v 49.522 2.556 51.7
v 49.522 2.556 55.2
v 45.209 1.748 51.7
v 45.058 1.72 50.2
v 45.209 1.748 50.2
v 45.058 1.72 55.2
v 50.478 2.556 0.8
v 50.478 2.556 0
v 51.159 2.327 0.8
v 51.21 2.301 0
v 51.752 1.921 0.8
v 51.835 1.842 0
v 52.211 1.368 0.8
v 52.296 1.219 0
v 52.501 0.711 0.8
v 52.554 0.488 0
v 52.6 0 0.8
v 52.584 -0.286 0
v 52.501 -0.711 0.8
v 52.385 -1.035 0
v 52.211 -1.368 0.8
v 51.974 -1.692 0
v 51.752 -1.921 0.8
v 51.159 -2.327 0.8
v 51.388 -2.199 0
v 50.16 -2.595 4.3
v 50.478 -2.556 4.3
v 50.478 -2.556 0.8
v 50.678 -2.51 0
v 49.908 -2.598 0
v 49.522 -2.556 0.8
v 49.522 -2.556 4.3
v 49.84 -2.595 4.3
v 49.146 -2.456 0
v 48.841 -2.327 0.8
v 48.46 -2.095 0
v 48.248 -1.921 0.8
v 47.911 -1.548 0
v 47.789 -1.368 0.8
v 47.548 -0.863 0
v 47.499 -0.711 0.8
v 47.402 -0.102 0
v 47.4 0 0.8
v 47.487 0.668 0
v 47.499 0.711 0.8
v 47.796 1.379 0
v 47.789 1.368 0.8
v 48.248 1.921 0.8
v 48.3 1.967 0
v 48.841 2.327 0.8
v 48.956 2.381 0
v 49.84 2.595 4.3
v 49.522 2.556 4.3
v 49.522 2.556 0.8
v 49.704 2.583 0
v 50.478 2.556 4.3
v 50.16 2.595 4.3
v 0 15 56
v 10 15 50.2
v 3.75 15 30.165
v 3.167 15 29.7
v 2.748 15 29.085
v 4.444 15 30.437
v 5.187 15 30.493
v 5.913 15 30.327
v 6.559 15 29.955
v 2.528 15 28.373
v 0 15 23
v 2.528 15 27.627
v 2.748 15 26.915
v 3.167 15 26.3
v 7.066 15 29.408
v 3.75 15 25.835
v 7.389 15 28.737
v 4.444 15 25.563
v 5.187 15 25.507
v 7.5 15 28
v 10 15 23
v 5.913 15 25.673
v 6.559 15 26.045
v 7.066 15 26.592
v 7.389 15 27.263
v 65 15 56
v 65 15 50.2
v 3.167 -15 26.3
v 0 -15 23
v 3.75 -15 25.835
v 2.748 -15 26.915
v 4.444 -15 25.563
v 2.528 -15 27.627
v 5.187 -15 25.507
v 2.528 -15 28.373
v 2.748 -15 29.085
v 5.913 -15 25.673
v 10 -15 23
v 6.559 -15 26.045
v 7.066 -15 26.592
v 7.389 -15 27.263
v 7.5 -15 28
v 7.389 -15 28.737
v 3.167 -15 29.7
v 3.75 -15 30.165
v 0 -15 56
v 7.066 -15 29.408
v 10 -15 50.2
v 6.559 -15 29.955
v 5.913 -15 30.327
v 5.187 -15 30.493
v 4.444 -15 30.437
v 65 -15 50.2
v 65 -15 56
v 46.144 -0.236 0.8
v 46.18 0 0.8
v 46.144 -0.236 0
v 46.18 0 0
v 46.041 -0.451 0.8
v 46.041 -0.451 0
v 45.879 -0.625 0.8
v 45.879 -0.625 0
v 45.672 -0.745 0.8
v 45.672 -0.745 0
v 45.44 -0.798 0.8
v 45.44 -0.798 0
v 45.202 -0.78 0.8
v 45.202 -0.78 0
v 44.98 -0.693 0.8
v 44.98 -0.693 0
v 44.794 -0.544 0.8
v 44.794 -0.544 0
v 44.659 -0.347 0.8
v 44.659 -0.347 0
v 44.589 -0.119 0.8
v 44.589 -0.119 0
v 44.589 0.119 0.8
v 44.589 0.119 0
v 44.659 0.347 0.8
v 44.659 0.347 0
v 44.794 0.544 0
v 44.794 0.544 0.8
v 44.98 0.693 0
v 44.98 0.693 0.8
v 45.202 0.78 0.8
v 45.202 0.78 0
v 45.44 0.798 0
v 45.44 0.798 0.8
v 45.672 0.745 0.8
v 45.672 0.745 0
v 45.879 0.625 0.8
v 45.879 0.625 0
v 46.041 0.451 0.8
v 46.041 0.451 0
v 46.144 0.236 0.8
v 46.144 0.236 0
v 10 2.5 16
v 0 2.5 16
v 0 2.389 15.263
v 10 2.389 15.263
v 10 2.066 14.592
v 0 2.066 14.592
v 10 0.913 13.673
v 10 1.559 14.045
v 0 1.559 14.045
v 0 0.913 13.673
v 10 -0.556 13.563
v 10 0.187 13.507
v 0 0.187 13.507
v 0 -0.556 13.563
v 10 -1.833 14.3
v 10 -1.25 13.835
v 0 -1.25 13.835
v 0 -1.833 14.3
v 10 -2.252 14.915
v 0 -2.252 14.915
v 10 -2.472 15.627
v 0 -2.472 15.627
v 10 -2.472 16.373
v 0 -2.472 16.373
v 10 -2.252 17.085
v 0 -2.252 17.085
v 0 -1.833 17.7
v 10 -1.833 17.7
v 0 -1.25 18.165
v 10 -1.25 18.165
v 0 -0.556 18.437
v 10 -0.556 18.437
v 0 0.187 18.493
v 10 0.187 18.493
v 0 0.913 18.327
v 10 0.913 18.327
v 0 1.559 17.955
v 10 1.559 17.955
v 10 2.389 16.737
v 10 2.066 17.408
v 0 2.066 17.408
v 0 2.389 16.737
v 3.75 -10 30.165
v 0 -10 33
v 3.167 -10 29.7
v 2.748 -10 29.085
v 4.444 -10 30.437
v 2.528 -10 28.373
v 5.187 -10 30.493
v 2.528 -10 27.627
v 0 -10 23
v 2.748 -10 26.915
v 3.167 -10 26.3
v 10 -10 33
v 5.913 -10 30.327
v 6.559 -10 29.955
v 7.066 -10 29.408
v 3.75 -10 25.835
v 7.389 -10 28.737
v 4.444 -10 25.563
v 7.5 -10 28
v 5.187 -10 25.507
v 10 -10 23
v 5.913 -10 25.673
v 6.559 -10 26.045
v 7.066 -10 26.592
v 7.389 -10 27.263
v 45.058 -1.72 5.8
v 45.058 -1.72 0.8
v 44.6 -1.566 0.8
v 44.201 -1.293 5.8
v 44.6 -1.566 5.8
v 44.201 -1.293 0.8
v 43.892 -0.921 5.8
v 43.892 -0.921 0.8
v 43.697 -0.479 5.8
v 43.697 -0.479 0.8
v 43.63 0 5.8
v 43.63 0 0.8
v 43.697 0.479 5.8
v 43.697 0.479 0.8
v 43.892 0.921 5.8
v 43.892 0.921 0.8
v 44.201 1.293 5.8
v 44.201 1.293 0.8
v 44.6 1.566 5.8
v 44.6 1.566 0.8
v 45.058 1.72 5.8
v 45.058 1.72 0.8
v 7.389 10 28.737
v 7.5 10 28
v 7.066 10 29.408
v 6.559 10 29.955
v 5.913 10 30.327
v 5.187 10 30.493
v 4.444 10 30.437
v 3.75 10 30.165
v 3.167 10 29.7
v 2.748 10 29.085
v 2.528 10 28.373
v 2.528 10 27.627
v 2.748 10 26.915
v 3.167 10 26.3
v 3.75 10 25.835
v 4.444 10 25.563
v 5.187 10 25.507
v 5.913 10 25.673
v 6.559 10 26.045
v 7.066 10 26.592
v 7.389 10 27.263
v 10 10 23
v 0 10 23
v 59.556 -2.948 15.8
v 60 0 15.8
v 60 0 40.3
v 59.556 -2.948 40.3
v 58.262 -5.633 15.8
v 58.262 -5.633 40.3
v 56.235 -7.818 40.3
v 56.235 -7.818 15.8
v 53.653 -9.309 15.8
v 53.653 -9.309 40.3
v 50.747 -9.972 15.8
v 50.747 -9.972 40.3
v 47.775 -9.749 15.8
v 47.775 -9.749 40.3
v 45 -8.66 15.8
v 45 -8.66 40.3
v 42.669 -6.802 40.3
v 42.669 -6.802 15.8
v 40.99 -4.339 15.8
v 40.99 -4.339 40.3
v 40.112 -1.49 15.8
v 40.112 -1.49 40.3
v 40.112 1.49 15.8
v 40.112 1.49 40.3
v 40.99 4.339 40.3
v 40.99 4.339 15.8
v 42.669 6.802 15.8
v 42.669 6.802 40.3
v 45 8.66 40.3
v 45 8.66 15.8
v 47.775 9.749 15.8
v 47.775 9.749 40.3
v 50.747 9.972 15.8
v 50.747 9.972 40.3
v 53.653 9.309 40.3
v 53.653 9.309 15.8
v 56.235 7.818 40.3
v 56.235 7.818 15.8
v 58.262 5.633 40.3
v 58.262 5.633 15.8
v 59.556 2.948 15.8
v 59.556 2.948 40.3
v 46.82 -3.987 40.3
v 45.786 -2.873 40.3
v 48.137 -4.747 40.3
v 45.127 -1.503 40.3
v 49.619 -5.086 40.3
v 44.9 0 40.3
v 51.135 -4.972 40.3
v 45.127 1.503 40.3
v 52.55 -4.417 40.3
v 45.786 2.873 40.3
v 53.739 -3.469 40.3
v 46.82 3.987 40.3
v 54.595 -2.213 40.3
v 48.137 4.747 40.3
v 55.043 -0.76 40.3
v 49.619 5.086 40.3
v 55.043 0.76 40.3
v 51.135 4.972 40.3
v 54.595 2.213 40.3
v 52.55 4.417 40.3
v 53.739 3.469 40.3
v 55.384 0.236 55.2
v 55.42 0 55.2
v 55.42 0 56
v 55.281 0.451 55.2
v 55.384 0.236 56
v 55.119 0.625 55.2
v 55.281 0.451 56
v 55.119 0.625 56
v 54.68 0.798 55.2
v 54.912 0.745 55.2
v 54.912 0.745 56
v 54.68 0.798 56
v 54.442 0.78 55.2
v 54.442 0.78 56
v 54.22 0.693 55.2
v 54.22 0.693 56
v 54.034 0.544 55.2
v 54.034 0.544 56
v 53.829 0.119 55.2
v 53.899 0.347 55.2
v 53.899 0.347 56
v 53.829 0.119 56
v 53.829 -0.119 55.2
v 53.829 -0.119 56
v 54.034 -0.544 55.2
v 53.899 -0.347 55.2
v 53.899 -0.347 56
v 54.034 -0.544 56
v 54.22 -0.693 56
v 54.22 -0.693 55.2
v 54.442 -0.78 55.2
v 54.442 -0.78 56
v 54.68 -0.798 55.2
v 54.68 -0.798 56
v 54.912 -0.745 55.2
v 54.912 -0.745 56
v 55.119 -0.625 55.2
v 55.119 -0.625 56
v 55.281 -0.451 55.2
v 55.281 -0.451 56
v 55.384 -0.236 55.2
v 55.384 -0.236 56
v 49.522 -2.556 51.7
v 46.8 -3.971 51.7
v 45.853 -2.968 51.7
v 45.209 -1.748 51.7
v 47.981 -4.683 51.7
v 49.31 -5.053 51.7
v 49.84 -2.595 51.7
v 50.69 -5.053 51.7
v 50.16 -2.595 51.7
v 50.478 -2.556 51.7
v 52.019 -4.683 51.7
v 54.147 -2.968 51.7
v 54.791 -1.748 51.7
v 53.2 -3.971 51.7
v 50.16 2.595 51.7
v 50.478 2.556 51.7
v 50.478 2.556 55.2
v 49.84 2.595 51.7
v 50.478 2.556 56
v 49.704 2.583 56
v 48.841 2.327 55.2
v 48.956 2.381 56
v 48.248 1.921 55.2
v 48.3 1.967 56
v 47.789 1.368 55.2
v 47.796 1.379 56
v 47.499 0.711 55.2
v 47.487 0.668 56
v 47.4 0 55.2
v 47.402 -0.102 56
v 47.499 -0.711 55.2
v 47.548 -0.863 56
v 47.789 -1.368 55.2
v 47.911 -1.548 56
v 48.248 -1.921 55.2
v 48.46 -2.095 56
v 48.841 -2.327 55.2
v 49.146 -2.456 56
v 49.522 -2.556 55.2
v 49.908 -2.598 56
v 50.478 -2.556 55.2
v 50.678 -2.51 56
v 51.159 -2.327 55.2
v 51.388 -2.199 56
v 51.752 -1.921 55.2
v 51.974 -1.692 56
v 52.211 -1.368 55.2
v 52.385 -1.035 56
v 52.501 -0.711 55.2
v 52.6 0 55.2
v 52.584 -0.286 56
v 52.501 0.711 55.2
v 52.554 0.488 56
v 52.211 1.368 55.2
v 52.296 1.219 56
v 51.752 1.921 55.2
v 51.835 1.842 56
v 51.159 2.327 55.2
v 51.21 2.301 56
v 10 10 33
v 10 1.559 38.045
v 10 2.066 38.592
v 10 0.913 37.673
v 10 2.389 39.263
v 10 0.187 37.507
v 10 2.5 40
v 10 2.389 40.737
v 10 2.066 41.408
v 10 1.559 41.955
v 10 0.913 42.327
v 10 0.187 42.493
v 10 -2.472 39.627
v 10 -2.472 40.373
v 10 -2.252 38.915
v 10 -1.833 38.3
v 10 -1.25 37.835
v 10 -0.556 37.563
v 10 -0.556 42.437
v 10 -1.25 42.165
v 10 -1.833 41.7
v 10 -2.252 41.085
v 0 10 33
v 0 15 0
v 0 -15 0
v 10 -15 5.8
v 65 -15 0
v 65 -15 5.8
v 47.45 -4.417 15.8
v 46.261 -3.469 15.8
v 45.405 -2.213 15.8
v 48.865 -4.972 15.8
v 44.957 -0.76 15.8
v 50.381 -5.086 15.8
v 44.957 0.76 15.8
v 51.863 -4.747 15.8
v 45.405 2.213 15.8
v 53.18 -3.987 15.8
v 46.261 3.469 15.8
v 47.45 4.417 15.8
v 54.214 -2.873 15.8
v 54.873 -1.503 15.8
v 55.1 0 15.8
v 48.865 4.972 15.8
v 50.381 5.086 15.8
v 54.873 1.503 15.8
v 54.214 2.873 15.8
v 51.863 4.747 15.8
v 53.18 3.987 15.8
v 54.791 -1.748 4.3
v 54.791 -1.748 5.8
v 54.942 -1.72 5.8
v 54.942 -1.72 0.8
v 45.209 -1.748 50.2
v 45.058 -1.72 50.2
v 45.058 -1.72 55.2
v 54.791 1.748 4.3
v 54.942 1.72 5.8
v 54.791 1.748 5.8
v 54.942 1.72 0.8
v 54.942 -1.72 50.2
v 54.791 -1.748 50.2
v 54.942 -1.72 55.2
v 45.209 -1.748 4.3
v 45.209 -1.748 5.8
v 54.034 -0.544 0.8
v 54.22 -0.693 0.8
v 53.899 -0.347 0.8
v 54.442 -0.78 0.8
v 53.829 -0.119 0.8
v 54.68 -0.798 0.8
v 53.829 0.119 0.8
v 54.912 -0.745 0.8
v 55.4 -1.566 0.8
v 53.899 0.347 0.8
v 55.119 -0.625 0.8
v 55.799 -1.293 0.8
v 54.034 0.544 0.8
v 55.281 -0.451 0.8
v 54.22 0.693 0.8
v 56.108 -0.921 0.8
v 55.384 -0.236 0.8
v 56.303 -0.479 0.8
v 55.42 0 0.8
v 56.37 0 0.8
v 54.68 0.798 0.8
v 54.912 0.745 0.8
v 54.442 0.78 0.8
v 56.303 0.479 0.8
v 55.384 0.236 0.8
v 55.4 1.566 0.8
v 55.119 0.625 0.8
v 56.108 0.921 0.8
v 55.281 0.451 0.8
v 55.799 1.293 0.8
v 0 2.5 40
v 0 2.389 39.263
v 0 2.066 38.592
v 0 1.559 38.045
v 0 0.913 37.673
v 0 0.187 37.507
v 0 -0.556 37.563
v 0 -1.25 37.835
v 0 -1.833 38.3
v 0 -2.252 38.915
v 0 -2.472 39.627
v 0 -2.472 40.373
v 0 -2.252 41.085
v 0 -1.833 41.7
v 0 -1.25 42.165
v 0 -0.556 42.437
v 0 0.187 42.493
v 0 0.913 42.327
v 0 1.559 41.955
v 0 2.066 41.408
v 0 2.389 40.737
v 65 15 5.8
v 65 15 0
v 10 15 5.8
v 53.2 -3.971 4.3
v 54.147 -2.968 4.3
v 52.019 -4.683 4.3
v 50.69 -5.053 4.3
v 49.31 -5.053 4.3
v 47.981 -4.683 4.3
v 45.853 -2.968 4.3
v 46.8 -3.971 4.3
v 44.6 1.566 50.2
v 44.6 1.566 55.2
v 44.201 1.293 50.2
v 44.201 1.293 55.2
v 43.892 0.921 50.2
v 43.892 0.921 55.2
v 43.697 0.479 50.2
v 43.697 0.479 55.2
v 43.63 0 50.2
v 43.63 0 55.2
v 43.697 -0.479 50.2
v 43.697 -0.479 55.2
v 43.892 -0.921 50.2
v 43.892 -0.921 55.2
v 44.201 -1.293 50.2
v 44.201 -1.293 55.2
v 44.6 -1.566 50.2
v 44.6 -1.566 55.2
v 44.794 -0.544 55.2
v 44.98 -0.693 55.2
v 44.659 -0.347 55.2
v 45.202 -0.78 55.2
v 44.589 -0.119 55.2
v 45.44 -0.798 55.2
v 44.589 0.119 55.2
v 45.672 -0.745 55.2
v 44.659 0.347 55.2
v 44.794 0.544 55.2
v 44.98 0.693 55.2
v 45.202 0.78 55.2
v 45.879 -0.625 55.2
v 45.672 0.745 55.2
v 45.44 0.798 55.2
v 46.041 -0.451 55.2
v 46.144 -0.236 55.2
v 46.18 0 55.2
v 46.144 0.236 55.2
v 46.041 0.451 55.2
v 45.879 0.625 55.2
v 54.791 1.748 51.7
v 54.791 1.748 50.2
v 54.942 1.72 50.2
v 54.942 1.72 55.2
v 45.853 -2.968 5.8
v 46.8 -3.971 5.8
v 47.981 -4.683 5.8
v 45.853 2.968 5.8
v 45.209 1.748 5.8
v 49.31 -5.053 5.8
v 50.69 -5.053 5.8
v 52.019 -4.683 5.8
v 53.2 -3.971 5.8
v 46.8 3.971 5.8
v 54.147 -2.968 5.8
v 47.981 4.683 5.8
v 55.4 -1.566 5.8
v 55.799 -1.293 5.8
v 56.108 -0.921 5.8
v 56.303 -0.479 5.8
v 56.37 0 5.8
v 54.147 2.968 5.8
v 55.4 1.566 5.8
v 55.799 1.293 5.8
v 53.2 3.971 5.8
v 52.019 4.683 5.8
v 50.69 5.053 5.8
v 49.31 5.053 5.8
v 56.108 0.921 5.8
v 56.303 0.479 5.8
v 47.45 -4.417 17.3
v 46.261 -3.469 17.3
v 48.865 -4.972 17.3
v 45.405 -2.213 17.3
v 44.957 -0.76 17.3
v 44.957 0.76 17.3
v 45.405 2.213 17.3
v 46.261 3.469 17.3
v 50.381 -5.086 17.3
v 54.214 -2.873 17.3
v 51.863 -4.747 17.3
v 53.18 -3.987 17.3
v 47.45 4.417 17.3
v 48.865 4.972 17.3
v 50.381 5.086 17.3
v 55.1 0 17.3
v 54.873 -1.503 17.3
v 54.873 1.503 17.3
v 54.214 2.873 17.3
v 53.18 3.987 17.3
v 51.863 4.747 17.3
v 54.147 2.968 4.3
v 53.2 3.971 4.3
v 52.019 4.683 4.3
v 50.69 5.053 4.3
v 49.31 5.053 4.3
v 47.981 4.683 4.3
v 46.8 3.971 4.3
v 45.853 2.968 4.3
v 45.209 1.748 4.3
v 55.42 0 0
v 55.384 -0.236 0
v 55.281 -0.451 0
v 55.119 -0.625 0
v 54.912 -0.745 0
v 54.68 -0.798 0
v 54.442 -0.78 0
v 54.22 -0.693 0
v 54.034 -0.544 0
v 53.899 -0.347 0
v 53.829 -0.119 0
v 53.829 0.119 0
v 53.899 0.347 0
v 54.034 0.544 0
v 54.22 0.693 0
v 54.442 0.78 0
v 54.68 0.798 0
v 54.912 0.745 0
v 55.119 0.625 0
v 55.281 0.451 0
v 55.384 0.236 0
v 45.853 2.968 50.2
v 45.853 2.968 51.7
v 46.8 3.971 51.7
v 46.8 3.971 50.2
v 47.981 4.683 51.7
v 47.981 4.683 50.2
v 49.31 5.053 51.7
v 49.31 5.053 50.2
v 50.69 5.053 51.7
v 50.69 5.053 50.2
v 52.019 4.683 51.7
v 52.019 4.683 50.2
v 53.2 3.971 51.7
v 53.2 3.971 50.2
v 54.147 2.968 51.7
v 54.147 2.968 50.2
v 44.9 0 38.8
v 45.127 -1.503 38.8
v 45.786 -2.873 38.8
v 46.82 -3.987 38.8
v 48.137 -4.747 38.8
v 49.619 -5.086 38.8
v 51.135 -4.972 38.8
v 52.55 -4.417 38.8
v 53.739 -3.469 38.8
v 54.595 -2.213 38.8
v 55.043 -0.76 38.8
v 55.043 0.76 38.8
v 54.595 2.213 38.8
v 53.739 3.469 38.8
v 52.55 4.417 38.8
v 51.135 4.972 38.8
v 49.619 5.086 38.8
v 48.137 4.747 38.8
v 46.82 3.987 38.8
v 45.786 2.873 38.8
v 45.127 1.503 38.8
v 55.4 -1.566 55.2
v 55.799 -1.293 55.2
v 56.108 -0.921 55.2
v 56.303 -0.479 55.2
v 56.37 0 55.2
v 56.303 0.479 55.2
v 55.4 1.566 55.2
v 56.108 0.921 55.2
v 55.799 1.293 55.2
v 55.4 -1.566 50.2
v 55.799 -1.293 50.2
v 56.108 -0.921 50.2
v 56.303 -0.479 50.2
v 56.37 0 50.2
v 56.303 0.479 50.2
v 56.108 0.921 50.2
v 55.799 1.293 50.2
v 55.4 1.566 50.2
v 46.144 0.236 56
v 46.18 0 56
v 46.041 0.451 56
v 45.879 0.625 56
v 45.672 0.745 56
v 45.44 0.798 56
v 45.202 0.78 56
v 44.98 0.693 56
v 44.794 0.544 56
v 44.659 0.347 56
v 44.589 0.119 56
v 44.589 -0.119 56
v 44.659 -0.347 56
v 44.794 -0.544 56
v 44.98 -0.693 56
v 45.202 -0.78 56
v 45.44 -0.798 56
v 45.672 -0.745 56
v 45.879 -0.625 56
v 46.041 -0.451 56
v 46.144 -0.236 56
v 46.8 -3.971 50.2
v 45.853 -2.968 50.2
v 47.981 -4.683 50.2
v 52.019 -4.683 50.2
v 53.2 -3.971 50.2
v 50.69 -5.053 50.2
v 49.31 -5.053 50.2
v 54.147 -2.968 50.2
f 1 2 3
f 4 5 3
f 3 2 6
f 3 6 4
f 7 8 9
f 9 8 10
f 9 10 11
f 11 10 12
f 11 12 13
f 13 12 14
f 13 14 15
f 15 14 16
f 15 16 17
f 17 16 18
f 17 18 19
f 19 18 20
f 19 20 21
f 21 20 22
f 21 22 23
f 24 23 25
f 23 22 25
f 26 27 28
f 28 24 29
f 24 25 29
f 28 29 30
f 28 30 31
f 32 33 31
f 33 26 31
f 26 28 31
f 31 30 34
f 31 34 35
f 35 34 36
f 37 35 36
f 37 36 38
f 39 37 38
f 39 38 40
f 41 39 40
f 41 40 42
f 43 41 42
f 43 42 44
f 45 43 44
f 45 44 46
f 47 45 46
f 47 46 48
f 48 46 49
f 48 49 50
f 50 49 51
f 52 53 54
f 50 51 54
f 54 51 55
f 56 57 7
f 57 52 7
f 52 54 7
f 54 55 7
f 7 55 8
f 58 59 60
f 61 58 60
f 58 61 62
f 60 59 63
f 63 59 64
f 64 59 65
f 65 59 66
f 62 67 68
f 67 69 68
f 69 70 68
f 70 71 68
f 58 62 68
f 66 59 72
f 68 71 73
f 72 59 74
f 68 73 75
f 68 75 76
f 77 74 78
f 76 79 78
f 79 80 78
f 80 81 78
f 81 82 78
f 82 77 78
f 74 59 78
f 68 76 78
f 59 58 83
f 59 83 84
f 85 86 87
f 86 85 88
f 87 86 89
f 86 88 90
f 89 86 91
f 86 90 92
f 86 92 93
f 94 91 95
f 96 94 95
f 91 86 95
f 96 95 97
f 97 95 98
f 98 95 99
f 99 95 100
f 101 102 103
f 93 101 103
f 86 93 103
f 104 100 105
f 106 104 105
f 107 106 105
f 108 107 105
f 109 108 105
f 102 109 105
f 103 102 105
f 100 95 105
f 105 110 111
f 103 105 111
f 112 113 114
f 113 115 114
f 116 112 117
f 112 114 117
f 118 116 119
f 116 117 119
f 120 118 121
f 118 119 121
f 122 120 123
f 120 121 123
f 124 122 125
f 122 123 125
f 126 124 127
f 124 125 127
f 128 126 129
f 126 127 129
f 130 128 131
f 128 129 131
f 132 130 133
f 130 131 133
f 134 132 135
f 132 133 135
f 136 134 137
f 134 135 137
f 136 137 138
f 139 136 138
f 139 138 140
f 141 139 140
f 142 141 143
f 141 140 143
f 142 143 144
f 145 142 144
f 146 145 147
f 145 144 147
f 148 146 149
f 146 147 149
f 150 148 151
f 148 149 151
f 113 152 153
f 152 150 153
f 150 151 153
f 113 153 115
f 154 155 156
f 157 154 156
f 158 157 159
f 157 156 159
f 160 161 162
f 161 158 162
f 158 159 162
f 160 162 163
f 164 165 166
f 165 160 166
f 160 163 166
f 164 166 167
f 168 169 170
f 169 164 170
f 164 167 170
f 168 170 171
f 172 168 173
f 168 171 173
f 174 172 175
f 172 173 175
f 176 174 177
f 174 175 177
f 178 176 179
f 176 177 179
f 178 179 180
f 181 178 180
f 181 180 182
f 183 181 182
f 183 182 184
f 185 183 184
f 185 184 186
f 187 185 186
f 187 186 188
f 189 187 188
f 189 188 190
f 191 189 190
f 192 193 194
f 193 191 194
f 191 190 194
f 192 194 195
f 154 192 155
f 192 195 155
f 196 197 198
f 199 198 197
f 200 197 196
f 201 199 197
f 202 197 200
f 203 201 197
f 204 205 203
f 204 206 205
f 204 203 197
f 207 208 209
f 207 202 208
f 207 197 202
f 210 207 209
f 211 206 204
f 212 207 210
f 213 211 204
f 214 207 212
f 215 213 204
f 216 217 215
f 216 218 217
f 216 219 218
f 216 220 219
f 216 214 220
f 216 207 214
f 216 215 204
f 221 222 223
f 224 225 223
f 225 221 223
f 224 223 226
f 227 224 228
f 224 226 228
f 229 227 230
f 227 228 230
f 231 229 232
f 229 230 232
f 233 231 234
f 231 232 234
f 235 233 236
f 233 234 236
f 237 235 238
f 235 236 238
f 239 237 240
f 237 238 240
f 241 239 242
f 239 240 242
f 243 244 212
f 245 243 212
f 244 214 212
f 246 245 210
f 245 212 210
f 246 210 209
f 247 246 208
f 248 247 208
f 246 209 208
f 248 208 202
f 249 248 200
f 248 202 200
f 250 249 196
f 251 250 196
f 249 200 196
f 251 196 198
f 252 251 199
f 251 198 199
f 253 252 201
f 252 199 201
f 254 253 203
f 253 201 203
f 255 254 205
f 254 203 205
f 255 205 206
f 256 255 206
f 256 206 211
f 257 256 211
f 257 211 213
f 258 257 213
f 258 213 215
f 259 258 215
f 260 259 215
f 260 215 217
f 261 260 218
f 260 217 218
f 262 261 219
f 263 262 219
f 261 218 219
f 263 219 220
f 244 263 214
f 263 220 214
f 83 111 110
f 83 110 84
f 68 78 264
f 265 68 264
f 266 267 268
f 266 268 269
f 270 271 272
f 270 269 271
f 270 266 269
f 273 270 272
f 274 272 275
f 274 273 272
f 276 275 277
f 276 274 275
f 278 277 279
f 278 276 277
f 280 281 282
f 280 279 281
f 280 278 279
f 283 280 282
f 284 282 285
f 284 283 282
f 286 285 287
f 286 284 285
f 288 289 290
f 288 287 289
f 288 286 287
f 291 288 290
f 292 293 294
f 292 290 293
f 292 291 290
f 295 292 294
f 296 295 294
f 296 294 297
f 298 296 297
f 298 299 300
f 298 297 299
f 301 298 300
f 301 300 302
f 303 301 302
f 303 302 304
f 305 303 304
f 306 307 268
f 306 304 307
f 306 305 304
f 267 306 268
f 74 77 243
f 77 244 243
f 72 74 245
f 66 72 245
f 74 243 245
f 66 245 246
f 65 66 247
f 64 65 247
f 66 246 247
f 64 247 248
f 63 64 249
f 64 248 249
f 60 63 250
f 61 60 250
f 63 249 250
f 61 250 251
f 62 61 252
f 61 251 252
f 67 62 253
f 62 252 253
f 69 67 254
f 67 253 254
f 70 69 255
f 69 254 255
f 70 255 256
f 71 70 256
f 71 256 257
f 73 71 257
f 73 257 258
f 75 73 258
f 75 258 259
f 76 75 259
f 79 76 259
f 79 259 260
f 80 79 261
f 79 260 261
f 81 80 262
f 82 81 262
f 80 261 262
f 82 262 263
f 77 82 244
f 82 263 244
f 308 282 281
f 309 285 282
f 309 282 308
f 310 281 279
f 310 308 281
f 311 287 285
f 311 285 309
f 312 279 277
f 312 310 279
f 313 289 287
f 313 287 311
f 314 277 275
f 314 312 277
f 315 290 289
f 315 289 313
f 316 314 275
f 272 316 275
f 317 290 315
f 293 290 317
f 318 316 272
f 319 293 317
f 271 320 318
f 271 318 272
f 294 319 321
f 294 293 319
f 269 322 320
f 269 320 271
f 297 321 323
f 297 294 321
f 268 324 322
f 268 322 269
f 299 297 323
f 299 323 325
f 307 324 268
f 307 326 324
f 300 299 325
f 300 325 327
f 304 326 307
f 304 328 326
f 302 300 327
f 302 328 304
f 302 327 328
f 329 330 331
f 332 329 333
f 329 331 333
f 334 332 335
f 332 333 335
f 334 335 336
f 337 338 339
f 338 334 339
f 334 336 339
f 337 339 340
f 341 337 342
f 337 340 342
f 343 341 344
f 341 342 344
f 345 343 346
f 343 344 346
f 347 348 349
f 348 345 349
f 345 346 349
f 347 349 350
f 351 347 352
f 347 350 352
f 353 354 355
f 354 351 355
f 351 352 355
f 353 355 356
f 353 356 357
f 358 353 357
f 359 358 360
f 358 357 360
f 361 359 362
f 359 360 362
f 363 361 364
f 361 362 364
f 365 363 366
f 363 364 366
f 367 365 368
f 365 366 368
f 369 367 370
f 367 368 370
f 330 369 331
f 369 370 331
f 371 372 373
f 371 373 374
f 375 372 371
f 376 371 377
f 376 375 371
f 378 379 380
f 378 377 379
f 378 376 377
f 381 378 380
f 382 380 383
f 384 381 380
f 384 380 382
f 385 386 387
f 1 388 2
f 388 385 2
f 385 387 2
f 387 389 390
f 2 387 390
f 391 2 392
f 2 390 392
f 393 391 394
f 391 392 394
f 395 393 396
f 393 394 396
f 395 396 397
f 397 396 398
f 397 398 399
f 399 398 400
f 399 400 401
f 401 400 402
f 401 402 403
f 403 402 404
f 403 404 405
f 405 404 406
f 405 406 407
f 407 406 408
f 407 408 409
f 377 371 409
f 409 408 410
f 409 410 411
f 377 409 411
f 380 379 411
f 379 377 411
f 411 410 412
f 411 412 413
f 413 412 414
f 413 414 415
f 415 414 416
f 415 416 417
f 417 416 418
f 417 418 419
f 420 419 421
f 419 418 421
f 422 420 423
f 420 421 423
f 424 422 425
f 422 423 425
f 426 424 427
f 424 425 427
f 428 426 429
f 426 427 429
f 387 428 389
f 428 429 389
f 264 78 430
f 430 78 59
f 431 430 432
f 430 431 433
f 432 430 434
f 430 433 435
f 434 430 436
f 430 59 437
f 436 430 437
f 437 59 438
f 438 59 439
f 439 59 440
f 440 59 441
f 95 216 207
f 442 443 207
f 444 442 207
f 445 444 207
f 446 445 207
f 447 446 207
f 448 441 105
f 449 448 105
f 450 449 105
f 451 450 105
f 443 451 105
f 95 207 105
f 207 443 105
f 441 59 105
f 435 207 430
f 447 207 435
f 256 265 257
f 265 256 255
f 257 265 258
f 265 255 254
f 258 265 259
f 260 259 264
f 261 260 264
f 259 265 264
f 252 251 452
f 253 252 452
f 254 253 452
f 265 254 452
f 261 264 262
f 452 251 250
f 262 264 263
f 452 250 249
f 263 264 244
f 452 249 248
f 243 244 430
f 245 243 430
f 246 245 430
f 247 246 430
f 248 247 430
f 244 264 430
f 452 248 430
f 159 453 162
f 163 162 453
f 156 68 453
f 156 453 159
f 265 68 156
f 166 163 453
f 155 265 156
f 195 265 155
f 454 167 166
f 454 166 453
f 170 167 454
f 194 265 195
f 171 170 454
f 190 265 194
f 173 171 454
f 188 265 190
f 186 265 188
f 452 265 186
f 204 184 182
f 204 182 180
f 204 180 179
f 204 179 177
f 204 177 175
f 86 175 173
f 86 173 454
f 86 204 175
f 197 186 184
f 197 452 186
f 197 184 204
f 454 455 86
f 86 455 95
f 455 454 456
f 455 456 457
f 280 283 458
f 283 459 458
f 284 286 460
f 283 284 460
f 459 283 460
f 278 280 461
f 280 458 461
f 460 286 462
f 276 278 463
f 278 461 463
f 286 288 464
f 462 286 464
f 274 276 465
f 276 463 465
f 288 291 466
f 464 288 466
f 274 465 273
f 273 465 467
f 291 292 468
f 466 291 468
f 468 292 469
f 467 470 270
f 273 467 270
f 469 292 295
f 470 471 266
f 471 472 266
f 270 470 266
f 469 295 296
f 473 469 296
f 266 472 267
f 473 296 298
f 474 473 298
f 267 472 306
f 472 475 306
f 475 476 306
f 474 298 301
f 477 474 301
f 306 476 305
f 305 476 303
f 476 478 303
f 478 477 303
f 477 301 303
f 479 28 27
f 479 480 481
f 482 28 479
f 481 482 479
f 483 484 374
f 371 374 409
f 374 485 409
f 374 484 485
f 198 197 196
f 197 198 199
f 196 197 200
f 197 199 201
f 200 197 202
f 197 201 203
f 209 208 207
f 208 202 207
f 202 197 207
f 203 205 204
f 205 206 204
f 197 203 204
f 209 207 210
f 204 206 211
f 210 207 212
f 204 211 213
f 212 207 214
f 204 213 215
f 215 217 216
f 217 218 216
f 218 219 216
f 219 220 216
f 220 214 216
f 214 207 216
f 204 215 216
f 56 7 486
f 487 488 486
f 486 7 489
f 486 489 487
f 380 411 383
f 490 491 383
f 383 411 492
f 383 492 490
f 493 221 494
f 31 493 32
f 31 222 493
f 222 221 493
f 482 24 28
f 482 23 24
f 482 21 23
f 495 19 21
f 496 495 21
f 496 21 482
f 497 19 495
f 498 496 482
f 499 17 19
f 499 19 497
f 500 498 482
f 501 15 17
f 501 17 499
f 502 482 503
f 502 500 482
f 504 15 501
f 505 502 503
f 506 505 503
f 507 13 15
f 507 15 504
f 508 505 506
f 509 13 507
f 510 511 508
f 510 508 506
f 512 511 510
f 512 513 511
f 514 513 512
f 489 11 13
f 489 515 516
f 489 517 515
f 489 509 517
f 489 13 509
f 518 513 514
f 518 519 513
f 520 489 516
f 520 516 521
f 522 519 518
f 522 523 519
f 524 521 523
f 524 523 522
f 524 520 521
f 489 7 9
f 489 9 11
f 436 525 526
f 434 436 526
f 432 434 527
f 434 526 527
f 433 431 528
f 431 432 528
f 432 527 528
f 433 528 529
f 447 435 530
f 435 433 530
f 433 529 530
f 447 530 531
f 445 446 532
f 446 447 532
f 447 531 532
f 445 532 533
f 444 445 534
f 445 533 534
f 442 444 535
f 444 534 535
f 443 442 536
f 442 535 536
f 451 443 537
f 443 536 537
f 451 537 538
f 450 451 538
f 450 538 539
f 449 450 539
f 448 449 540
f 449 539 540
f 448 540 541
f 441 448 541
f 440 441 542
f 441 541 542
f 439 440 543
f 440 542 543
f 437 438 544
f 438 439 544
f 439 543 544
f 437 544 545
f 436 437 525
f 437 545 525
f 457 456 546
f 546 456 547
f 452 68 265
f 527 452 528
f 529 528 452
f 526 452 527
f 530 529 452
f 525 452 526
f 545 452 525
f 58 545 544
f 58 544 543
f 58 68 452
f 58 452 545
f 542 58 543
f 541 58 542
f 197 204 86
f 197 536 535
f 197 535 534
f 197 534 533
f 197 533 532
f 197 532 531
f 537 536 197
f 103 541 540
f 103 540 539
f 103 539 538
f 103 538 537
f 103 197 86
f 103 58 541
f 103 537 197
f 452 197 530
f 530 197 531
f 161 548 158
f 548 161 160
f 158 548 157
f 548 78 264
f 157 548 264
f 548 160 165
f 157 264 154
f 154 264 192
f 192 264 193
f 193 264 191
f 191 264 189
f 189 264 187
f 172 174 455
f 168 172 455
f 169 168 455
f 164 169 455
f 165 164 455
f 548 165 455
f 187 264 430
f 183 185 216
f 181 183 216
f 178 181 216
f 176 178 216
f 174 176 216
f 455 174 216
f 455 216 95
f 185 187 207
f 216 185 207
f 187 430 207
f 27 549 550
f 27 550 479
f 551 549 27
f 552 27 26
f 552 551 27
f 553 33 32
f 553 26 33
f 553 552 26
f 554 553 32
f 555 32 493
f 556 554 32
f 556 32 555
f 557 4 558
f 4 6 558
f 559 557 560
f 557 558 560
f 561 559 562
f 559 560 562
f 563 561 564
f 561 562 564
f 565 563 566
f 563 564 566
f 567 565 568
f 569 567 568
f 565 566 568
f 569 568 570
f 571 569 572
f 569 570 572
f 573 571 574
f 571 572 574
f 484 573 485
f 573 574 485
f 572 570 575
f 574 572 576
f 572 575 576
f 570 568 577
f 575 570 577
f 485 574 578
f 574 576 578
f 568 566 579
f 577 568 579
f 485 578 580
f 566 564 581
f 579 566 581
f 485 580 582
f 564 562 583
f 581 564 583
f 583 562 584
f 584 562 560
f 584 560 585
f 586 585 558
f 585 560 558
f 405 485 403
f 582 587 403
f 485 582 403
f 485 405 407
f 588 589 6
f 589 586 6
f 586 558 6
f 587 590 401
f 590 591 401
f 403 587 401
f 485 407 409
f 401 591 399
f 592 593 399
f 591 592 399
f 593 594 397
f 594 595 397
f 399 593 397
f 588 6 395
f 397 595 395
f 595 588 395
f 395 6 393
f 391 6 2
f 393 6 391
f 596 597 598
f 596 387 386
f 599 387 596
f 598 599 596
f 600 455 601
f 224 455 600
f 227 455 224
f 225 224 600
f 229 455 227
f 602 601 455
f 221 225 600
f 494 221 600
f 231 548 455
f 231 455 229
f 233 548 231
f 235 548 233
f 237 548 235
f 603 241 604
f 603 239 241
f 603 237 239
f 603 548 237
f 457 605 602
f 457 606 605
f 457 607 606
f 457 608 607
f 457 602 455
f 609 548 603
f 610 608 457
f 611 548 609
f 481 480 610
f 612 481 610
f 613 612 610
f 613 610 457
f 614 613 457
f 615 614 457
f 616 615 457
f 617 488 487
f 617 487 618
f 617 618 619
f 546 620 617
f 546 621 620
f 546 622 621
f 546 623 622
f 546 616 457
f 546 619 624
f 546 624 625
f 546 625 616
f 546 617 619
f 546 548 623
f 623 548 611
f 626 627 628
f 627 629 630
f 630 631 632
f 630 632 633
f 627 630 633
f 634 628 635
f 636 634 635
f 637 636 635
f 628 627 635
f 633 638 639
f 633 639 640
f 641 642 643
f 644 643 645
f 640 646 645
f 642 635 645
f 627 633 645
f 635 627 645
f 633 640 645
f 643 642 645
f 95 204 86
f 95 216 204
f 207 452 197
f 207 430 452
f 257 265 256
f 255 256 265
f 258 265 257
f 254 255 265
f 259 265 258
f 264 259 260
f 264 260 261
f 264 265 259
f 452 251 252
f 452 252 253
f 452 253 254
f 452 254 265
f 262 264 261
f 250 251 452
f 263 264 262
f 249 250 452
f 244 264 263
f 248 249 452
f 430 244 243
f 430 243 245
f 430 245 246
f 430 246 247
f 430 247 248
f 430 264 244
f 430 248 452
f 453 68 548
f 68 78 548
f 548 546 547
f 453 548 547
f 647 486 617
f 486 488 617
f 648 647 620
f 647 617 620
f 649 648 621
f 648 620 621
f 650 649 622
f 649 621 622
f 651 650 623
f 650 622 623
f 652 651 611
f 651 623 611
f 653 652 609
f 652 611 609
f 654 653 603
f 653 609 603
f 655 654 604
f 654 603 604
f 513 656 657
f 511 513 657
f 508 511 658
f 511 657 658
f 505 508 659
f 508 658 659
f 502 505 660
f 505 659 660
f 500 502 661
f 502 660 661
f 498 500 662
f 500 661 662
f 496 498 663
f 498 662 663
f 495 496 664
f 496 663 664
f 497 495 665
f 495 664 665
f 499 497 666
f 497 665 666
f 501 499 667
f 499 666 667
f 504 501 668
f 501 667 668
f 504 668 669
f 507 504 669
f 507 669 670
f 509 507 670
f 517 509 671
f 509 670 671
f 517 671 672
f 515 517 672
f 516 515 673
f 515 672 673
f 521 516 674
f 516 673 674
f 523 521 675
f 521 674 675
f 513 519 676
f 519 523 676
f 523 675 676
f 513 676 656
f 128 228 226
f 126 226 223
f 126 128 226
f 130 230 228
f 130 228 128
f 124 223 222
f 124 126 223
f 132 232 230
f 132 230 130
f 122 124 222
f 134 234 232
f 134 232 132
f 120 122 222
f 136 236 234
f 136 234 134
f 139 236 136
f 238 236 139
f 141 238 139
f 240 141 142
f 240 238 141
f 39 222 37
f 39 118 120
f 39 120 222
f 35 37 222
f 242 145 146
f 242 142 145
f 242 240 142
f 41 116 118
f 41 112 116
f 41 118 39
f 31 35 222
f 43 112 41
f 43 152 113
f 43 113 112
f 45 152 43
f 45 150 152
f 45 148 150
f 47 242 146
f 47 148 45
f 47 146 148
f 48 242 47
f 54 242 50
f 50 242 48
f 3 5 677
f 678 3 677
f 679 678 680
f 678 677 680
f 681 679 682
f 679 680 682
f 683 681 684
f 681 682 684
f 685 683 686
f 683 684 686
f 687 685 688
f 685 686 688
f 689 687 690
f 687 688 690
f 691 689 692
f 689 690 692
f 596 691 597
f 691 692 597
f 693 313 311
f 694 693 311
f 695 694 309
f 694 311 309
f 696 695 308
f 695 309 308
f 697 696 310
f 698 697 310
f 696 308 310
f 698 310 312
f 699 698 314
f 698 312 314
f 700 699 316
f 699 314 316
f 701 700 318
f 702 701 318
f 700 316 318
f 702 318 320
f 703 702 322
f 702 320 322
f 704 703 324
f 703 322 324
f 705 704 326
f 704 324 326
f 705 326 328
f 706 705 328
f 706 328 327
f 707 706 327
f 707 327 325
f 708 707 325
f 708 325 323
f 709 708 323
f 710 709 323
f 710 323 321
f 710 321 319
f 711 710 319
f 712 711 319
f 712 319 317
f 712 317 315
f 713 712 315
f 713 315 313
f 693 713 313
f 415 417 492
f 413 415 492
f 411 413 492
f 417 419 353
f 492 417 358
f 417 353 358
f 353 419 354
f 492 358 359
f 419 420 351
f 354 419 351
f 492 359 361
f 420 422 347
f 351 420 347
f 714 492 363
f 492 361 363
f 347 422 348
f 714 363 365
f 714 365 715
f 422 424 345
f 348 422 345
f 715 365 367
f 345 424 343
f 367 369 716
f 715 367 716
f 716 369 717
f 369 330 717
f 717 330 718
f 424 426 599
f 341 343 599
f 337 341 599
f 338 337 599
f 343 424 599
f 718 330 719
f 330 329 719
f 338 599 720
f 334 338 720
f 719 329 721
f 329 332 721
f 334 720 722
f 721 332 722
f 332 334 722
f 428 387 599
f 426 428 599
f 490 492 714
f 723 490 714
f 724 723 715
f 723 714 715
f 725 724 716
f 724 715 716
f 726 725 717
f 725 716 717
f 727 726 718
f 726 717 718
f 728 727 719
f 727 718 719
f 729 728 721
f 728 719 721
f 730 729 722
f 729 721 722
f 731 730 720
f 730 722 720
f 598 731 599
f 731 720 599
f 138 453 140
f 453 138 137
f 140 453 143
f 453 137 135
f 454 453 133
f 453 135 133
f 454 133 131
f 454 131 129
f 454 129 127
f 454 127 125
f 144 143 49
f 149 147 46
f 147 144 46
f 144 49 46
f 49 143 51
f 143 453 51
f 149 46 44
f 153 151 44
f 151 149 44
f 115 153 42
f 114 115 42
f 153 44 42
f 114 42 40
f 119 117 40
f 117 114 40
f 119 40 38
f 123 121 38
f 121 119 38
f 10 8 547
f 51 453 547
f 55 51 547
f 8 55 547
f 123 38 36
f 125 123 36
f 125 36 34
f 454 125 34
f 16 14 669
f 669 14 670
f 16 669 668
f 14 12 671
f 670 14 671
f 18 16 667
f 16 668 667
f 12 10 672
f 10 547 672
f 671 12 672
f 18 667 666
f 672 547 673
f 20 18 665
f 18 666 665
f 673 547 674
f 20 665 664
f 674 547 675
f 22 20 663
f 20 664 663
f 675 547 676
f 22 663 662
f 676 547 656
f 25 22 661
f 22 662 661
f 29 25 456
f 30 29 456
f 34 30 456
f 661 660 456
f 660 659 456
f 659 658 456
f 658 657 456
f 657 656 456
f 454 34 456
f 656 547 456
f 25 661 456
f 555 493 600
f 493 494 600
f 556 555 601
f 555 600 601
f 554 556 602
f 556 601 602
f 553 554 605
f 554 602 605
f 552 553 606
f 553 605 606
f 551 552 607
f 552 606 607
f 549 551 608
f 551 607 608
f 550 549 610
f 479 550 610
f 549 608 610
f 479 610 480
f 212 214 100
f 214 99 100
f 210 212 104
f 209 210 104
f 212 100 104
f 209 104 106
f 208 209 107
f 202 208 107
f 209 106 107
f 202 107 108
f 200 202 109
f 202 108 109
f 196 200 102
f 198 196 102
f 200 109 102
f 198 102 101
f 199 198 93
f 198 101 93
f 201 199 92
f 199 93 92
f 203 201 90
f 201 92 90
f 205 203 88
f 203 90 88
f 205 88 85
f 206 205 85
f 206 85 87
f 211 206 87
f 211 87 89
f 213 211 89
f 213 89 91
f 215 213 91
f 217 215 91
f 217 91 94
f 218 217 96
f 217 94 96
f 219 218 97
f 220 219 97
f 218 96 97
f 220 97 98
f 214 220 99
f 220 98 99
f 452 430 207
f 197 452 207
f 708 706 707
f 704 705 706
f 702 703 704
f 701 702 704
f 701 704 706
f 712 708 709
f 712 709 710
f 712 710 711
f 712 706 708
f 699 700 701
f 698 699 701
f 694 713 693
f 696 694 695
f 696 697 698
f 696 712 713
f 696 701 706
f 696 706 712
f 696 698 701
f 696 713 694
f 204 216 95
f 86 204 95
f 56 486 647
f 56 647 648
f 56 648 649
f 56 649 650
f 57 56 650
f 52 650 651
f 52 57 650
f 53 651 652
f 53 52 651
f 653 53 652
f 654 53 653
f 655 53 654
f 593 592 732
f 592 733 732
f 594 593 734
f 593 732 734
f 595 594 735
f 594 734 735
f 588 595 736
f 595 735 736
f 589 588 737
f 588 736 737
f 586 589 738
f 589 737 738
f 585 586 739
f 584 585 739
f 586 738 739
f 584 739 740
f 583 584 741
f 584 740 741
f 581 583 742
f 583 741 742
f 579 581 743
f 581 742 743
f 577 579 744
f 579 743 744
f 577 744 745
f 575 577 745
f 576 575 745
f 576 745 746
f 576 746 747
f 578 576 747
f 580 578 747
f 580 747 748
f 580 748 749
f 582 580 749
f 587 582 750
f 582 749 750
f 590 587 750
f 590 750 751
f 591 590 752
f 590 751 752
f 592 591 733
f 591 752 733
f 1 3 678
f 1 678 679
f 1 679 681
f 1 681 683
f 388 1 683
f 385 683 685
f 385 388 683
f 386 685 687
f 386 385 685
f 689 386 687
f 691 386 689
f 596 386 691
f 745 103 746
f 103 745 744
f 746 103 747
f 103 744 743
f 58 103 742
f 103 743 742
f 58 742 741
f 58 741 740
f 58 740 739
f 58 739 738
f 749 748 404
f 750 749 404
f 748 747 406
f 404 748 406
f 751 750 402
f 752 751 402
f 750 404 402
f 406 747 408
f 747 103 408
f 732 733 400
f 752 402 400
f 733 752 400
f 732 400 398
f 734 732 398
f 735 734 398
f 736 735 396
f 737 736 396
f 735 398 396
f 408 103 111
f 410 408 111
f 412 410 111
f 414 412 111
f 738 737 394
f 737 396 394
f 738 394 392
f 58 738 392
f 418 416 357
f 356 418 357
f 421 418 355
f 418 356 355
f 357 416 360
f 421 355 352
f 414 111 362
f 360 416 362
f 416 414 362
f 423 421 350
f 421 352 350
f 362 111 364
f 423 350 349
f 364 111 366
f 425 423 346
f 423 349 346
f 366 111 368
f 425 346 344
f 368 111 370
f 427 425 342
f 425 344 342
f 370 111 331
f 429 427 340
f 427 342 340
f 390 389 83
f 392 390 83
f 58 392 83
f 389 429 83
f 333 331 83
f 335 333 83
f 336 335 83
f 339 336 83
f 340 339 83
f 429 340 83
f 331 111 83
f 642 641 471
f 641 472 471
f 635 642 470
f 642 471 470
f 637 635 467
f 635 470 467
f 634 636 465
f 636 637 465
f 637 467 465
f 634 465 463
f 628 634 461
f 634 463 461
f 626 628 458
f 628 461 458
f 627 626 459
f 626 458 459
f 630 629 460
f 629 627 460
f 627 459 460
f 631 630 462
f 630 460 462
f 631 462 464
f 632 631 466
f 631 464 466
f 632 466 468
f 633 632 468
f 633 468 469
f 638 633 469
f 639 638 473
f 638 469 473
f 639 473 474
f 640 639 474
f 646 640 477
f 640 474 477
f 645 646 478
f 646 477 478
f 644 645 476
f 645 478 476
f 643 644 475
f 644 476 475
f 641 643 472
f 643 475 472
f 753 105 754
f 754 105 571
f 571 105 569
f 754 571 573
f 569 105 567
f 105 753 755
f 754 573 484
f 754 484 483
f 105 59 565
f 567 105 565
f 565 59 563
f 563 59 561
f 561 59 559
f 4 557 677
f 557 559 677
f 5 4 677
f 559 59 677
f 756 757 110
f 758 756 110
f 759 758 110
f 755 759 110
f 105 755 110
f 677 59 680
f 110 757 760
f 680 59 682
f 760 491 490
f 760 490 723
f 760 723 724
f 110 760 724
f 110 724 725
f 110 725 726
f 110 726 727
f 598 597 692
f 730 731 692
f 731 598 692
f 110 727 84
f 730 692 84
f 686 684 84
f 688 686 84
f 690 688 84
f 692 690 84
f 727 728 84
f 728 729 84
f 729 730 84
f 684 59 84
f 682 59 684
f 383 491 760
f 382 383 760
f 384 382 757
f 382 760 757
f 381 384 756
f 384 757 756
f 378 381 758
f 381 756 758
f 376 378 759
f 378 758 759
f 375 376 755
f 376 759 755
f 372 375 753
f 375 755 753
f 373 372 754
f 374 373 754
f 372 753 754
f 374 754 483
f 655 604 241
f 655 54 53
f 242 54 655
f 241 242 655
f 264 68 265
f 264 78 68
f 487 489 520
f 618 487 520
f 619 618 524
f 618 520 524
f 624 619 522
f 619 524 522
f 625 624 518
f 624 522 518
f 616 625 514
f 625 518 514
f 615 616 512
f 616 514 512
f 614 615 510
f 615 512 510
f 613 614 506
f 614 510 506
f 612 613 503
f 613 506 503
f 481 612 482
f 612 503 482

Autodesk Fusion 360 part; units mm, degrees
sketch "Sketch1" plane through (0, 0, 0) normal (0, 0, 1) x (1, 0, 0)
  line L0 (0, -15) -> (65, -15)
  line L1 (65, -15) -> (65, 15)
  line L2 (65, 15) -> (0, 15)
  line L3 (0, 15) -> (0, -15)
  line L4 (54.62, 0) -> (45.38, 0) construction
  line L5 (45.058, -1.7201) -> (49.5216, -2.5556)
  circle A0 centre (50, 0) radius 2.6
  circle A1 centre (54.62, 0) radius 0.8
  circle A2 centre (54.62, 0) radius 1.75
  line L6 (50.4784, -2.5556) -> (54.942, -1.7201)
  line L7 (49.5216, 2.5556) -> (45.058, 1.7201)
  line L8 (50.4784, 2.5556) -> (54.942, 1.7201)
  circle A3 centre (45.38, 0) radius 0.8
  circle A4 centre (45.38, 0) radius 1.75
  line L9 (54.62, 0) -> (65, 0) construction
  line L10 (10, -15) -> (10, 15)
  point P0 (50, 0)
  point P1 (50, 0)
  dimension "d1" = 30
  dimension "d5" = 5.2
  dimension "d6" = 9.24
  dimension "d7" = 3.5
  dimension "d8" = 1.6
  dimension "d11" = 15
  dimension "d12" = 10
  dimension "d122" = 55
extrude "Extrude1" add sketch "Sketch1" along normal blind 0.8 contours L5 A0 L7 A4 | A4 | A0 A2 L6 L8 | A2 makes body 1 at (53.8101, 1.2278, 0.8) makes body 2 at (46.1899, -1.2278, 0)
extrude "Extrude2" add sketch "Sketch1" along normal blind 5.8 contours L0 L1 L2 L10 bodies 1 2
sketch "Sketch2" plane through (0, 0, 5.8) normal (0, 0, 1) x (-1, 0, 0)
  arc A0 (-50.4784, -2.5556) -> (-49.5216, -2.5556) centre (-50, 0) ccw
  line L0 (-50.4784, -2.5556) -> (-54.942, -1.7201)
  arc A1 (-54.942, 1.7201) -> (-54.942, -1.7201) centre (-54.62, 0) ccw
  line L1 (-54.942, 1.7201) -> (-50.4784, 2.5556)
  arc A2 (-49.5216, 2.5556) -> (-50.4784, 2.5556) centre (-50, 0) ccw
  line L2 (-49.5216, 2.5556) -> (-45.058, 1.7201)
  arc A3 (-45.058, -1.7201) -> (-45.058, 1.7201) centre (-45.38, 0) ccw
  line L3 (-45.058, -1.7201) -> (-49.5216, -2.5556)
  line L4 (-65, 15) -> (-65, -15)
  line L5 (-65, -15) -> (-10, -15)
  line L6 (-10, -15) -> (-10, 15)
  line L7 (-10, 15) -> (-65, 15)
  circle A4 centre (-50, 0) radius 5.1
  dimension "d17" = 10.2
extrude "Extrude3" cut sketch "Sketch2" against normal blind 1.5 contours A0 L0 L3 A4 | L1 A2 L2 A4 bodies 1
ref_plane "WorkPlane1" through (0, 0, 56) normal (0, 0, 1) x (1, 0, 0)
sketch "Sketch5" plane through (0, 0, 56) normal (0, 0, 1) x (1, 0, 0)
  line L0 (65, -15) -> (65, 15)
  line L1 (65, 15) -> (0, 15)
  line L2 (0, -15) -> (65, -15)
  line L3 (0, 15) -> (0, -15)
  line L4 (10, -15) -> (10, 15)
  line L5 (50.4784, -2.5556) -> (54.942, -1.7201)
  line L6 (54.62, 0) -> (65, 0)
  line L7 (54.62, 0) -> (45.38, 0)
  circle A0 centre (50, 0) radius 2.6
  circle A1 centre (54.62, 0) radius 1.75
  circle A2 centre (54.62, 0) radius 0.8
  line L8 (50.4784, 2.5556) -> (54.942, 1.7201)
  line L9 (49.5216, 2.5556) -> (45.058, 1.7201)
  line L10 (45.058, -1.7201) -> (49.5216, -2.5556)
  circle A3 centre (45.38, 0) radius 1.75
  circle A4 centre (45.38, 0) radius 0.8
extrude "Extrude7" add sketch "Sketch5" against normal blind 0.8 separate body contours L5 L7 A0 A1 | L6 L7 A1 A2 | L7 A0 L10 A3 | L7 A0 A1 L8 | L6 L7 A1 A2 | L7 A0 L9 A3 | A3 makes body 3 at (46.1899, -1.2278, 56) makes body 4 at (53.8101, 1.2278, 56)
extrude "Extrude8" add sketch "Sketch5" against normal blind 5.8 contours L0 L1 L2 L4 bodies 3 4
sketch "Sketch7" plane through (0, 0, 50.2) normal (0, 0, -1) x (1, 0, 0)
  arc A0 (49.5216, -2.5556) -> (50.4784, -2.5556) centre (50, 0) ccw
  line L0 (49.5216, -2.5556) -> (45.058, -1.7201)
  arc A1 (45.058, 1.7201) -> (45.058, -1.7201) centre (45.38, 0) ccw
  line L1 (45.058, 1.7201) -> (49.5216, 2.5556)
  arc A2 (50.4784, 2.5556) -> (49.5216, 2.5556) centre (50, 0) ccw
  line L2 (50.4784, 2.5556) -> (54.942, 1.7201)
  arc A3 (54.942, -1.7201) -> (54.942, 1.7201) centre (54.62, 0) ccw
  line L3 (54.942, -1.7201) -> (50.4784, -2.5556)
  line L4 (65, -15) -> (65, 15)
  line L5 (65, 15) -> (10, 15)
  line L6 (10, 15) -> (10, -15)
  line L7 (10, -15) -> (65, -15)
  circle A4 centre (50, 0) radius 5.1
extrude "Extrude9" cut sketch "Sketch7" against normal blind 1.5 contours A0 L0 L3 A4 | L1 A2 L2 A4 bodies 3
copy_body "Body->Comp1" bodies 1 removing the originals makes body 5 in component "Bottom Stand"
copy_body "Body->Comp2" bodies 3 removing the originals makes body 6 in component "Top Stand"
sketch "Sketch12" plane through (10, 0, 0) normal (-1, 0, 0) x (0, -1, 0)
  line L0 (-15, 0) -> (15, 0)
  line L1 (15, 0) -> (15, 5.8)
  line L2 (15, 5.8) -> (-15, 5.8)
  line L3 (-15, 5.8) -> (-15, 0)
  line L4 (-15, 0) -> (-15, 23)
  line L5 (-15, 23) -> (-10, 23)
  line L6 (-10, 23) -> (-10, 33)
  line L7 (-10, 33) -> (10, 33)
  line L8 (10, 33) -> (10, 23)
  line L9 (10, 23) -> (15, 23)
  line L10 (15, 23) -> (15, 0)
  line L11 (-15, 0) -> (15, 0)
  line L12 (15, 0) -> (15, 5.8)
  line L13 (15, 5.8) -> (-15, 5.8)
  line L14 (-15, 5.8) -> (-15, 0)
  line L15 (-15, 56) -> (-15, 23)
  line L16 (15, 23) -> (15, 56)
  line L17 (15, 56) -> (-15, 56)
  line L18 (15, 56) -> (-15, 56)
  line L19 (-15, 56) -> (-15, 50.2)
  line L20 (-15, 50.2) -> (15, 50.2)
  line L21 (15, 50.2) -> (15, 56)
  line L22 (10, 28) -> (-10, 28) construction
  line L23 (10, 28) -> (10, 50.2) construction
  line L24 (10, 28) -> (10, 5.8) construction
  dimension "d86" = 10
  dimension "d87" = 5
extrude "Extrude1'" add sketch "Sketch12" along normal blind 10 contours L0 L1 L2 L3 L4 L10 L11 L12 L13 L14 | L2 L4 L5 L6 L7 L8 L9 L10 L13 bodies 5 in component "Bottom Stand"
extrude "Extrude1''" add sketch "Sketch12" along normal blind 10 contours L5 L6 L7 L8 L9 L15 L16 L20 | L15 L16 L17 L18 L19 L20 L21 bodies 6 in component "Top Stand"
ref_plane "WorkPlane2" through (0, 0, 15.8) normal (0, 0, 1) x (1, 0, 0)
sketch "Sketch14" plane through (0, 0, 15.8) normal (0, 0, 1) x (1, 0, 0)
  circle A0 centre (50, 0) radius 2.6 construction
  circle A1 centre (50, 0) radius 10
  circle A2 centre (50, 0) radius 5.1
  dimension "d102" = 20
  dimension "d103" = 10.2
extrude "Extrude14" add sketch "Sketch14" along normal blind 24.5 separate body contours A1 | A2 makes body 7
extrude "Extrude15" cut sketch "Sketch14" along normal blind 1.5 contours A2 bodies 7
sketch "Sketch15" plane through (0, 0, 40.3) normal (0, 0, 1) x (-1, 0, 0)
  circle A0 centre (-50, 0) radius 10
  circle A1 centre (-50, 0) radius 5.1
extrude "Extrude16" cut sketch "Sketch15" against normal blind 1.5 contours A1 bodies 7
sketch "Sketch16" plane through (0, -15, 0) normal (0, -1, 0) x (1, 0, 0)
  line L0 (0, 0) -> (65, 0)
  line L1 (65, 0) -> (65, 5.8)
  line L2 (65, 5.8) -> (10, 5.8)
  line L3 (10, 5.8) -> (10, 23)
  line L4 (10, 23) -> (0, 23)
  line L5 (0, 23) -> (0, 0)
  circle A0 centre (5, 28) radius 2.5
  line L6 (5, 28) -> (5, 0) construction
  dimension "d110" = 5
  dimension "d113" = 28
  dimension "d114" = 5
extrude "Extrude2'" cut sketch "Sketch16" against normal blind 30 contours A0 bodies 5 in component "Bottom Stand"
extrude "Extrude2''" cut sketch "Sketch16" against normal blind 30 contours A0 bodies 6 in component "Top Stand"
sketch "Sketch17" plane through (0, 0, 0) normal (1, 0, 0) x (0, 1, 0)
  circle A0 centre (0, 16) radius 2.5
  circle A1 centre (0, 40) radius 2.5
  line L0 (15, 23) -> (15, 0)
  line L1 (15, 0) -> (-15, 0)
  line L2 (-15, 0) -> (-15, 23)
  line L3 (-15, 23) -> (-10, 23)
  line L4 (-10, 23) -> (-10, 33)
  line L5 (-10, 33) -> (10, 33)
  line L6 (10, 33) -> (10, 23)
  line L7 (10, 23) -> (15, 23)
  line L8 (-15, 23) -> (-15, 56)
  line L9 (-15, 56) -> (15, 56)
  line L10 (15, 56) -> (15, 23)
  line L11 (15, 23) -> (10, 23)
  line L12 (10, 23) -> (10, 33)
  line L13 (10, 33) -> (-10, 33)
  line L14 (-10, 33) -> (-10, 23)
  line L15 (-10, 23) -> (-15, 23)
  line L16 (0, 0) -> (0, 16) construction
  line L17 (0, 40) -> (0, 56) construction
  dimension "d119" = 5
  dimension "d120" = 24
extrude "Extrude3'" cut sketch "Sketch17" along normal blind 10 contours A0 | A1 bodies 5 in component "Bottom Stand"
extrude "Extrude3''" cut sketch "Sketch17" along normal blind 10 contours A0 | A1 bodies 6 in component "Top Stand"
component "Bottom Stand" placed x (1, 0, 0) y (0, 1, 0) z (0, 0, 1) at (0, 0, 0)
component "Top Stand" placed x (1, 0, 0) y (0, 1, 0) z (0, 0, 1) at (0, 0, 0)
equation "d15 = PlateThickness"
equation "d31 = Separation"
equation "PlateThickness = 5.8 mm"
equation "d35 = -PlateThickness"
equation "Separation = 56 mm" comment "original: 56"
equation "d104 = Separation - 31.5 mm"
equation "d113 = Separation / 2"
equation "Length = 55 mm" comment "original: 55"
equation "d122 = Length"
